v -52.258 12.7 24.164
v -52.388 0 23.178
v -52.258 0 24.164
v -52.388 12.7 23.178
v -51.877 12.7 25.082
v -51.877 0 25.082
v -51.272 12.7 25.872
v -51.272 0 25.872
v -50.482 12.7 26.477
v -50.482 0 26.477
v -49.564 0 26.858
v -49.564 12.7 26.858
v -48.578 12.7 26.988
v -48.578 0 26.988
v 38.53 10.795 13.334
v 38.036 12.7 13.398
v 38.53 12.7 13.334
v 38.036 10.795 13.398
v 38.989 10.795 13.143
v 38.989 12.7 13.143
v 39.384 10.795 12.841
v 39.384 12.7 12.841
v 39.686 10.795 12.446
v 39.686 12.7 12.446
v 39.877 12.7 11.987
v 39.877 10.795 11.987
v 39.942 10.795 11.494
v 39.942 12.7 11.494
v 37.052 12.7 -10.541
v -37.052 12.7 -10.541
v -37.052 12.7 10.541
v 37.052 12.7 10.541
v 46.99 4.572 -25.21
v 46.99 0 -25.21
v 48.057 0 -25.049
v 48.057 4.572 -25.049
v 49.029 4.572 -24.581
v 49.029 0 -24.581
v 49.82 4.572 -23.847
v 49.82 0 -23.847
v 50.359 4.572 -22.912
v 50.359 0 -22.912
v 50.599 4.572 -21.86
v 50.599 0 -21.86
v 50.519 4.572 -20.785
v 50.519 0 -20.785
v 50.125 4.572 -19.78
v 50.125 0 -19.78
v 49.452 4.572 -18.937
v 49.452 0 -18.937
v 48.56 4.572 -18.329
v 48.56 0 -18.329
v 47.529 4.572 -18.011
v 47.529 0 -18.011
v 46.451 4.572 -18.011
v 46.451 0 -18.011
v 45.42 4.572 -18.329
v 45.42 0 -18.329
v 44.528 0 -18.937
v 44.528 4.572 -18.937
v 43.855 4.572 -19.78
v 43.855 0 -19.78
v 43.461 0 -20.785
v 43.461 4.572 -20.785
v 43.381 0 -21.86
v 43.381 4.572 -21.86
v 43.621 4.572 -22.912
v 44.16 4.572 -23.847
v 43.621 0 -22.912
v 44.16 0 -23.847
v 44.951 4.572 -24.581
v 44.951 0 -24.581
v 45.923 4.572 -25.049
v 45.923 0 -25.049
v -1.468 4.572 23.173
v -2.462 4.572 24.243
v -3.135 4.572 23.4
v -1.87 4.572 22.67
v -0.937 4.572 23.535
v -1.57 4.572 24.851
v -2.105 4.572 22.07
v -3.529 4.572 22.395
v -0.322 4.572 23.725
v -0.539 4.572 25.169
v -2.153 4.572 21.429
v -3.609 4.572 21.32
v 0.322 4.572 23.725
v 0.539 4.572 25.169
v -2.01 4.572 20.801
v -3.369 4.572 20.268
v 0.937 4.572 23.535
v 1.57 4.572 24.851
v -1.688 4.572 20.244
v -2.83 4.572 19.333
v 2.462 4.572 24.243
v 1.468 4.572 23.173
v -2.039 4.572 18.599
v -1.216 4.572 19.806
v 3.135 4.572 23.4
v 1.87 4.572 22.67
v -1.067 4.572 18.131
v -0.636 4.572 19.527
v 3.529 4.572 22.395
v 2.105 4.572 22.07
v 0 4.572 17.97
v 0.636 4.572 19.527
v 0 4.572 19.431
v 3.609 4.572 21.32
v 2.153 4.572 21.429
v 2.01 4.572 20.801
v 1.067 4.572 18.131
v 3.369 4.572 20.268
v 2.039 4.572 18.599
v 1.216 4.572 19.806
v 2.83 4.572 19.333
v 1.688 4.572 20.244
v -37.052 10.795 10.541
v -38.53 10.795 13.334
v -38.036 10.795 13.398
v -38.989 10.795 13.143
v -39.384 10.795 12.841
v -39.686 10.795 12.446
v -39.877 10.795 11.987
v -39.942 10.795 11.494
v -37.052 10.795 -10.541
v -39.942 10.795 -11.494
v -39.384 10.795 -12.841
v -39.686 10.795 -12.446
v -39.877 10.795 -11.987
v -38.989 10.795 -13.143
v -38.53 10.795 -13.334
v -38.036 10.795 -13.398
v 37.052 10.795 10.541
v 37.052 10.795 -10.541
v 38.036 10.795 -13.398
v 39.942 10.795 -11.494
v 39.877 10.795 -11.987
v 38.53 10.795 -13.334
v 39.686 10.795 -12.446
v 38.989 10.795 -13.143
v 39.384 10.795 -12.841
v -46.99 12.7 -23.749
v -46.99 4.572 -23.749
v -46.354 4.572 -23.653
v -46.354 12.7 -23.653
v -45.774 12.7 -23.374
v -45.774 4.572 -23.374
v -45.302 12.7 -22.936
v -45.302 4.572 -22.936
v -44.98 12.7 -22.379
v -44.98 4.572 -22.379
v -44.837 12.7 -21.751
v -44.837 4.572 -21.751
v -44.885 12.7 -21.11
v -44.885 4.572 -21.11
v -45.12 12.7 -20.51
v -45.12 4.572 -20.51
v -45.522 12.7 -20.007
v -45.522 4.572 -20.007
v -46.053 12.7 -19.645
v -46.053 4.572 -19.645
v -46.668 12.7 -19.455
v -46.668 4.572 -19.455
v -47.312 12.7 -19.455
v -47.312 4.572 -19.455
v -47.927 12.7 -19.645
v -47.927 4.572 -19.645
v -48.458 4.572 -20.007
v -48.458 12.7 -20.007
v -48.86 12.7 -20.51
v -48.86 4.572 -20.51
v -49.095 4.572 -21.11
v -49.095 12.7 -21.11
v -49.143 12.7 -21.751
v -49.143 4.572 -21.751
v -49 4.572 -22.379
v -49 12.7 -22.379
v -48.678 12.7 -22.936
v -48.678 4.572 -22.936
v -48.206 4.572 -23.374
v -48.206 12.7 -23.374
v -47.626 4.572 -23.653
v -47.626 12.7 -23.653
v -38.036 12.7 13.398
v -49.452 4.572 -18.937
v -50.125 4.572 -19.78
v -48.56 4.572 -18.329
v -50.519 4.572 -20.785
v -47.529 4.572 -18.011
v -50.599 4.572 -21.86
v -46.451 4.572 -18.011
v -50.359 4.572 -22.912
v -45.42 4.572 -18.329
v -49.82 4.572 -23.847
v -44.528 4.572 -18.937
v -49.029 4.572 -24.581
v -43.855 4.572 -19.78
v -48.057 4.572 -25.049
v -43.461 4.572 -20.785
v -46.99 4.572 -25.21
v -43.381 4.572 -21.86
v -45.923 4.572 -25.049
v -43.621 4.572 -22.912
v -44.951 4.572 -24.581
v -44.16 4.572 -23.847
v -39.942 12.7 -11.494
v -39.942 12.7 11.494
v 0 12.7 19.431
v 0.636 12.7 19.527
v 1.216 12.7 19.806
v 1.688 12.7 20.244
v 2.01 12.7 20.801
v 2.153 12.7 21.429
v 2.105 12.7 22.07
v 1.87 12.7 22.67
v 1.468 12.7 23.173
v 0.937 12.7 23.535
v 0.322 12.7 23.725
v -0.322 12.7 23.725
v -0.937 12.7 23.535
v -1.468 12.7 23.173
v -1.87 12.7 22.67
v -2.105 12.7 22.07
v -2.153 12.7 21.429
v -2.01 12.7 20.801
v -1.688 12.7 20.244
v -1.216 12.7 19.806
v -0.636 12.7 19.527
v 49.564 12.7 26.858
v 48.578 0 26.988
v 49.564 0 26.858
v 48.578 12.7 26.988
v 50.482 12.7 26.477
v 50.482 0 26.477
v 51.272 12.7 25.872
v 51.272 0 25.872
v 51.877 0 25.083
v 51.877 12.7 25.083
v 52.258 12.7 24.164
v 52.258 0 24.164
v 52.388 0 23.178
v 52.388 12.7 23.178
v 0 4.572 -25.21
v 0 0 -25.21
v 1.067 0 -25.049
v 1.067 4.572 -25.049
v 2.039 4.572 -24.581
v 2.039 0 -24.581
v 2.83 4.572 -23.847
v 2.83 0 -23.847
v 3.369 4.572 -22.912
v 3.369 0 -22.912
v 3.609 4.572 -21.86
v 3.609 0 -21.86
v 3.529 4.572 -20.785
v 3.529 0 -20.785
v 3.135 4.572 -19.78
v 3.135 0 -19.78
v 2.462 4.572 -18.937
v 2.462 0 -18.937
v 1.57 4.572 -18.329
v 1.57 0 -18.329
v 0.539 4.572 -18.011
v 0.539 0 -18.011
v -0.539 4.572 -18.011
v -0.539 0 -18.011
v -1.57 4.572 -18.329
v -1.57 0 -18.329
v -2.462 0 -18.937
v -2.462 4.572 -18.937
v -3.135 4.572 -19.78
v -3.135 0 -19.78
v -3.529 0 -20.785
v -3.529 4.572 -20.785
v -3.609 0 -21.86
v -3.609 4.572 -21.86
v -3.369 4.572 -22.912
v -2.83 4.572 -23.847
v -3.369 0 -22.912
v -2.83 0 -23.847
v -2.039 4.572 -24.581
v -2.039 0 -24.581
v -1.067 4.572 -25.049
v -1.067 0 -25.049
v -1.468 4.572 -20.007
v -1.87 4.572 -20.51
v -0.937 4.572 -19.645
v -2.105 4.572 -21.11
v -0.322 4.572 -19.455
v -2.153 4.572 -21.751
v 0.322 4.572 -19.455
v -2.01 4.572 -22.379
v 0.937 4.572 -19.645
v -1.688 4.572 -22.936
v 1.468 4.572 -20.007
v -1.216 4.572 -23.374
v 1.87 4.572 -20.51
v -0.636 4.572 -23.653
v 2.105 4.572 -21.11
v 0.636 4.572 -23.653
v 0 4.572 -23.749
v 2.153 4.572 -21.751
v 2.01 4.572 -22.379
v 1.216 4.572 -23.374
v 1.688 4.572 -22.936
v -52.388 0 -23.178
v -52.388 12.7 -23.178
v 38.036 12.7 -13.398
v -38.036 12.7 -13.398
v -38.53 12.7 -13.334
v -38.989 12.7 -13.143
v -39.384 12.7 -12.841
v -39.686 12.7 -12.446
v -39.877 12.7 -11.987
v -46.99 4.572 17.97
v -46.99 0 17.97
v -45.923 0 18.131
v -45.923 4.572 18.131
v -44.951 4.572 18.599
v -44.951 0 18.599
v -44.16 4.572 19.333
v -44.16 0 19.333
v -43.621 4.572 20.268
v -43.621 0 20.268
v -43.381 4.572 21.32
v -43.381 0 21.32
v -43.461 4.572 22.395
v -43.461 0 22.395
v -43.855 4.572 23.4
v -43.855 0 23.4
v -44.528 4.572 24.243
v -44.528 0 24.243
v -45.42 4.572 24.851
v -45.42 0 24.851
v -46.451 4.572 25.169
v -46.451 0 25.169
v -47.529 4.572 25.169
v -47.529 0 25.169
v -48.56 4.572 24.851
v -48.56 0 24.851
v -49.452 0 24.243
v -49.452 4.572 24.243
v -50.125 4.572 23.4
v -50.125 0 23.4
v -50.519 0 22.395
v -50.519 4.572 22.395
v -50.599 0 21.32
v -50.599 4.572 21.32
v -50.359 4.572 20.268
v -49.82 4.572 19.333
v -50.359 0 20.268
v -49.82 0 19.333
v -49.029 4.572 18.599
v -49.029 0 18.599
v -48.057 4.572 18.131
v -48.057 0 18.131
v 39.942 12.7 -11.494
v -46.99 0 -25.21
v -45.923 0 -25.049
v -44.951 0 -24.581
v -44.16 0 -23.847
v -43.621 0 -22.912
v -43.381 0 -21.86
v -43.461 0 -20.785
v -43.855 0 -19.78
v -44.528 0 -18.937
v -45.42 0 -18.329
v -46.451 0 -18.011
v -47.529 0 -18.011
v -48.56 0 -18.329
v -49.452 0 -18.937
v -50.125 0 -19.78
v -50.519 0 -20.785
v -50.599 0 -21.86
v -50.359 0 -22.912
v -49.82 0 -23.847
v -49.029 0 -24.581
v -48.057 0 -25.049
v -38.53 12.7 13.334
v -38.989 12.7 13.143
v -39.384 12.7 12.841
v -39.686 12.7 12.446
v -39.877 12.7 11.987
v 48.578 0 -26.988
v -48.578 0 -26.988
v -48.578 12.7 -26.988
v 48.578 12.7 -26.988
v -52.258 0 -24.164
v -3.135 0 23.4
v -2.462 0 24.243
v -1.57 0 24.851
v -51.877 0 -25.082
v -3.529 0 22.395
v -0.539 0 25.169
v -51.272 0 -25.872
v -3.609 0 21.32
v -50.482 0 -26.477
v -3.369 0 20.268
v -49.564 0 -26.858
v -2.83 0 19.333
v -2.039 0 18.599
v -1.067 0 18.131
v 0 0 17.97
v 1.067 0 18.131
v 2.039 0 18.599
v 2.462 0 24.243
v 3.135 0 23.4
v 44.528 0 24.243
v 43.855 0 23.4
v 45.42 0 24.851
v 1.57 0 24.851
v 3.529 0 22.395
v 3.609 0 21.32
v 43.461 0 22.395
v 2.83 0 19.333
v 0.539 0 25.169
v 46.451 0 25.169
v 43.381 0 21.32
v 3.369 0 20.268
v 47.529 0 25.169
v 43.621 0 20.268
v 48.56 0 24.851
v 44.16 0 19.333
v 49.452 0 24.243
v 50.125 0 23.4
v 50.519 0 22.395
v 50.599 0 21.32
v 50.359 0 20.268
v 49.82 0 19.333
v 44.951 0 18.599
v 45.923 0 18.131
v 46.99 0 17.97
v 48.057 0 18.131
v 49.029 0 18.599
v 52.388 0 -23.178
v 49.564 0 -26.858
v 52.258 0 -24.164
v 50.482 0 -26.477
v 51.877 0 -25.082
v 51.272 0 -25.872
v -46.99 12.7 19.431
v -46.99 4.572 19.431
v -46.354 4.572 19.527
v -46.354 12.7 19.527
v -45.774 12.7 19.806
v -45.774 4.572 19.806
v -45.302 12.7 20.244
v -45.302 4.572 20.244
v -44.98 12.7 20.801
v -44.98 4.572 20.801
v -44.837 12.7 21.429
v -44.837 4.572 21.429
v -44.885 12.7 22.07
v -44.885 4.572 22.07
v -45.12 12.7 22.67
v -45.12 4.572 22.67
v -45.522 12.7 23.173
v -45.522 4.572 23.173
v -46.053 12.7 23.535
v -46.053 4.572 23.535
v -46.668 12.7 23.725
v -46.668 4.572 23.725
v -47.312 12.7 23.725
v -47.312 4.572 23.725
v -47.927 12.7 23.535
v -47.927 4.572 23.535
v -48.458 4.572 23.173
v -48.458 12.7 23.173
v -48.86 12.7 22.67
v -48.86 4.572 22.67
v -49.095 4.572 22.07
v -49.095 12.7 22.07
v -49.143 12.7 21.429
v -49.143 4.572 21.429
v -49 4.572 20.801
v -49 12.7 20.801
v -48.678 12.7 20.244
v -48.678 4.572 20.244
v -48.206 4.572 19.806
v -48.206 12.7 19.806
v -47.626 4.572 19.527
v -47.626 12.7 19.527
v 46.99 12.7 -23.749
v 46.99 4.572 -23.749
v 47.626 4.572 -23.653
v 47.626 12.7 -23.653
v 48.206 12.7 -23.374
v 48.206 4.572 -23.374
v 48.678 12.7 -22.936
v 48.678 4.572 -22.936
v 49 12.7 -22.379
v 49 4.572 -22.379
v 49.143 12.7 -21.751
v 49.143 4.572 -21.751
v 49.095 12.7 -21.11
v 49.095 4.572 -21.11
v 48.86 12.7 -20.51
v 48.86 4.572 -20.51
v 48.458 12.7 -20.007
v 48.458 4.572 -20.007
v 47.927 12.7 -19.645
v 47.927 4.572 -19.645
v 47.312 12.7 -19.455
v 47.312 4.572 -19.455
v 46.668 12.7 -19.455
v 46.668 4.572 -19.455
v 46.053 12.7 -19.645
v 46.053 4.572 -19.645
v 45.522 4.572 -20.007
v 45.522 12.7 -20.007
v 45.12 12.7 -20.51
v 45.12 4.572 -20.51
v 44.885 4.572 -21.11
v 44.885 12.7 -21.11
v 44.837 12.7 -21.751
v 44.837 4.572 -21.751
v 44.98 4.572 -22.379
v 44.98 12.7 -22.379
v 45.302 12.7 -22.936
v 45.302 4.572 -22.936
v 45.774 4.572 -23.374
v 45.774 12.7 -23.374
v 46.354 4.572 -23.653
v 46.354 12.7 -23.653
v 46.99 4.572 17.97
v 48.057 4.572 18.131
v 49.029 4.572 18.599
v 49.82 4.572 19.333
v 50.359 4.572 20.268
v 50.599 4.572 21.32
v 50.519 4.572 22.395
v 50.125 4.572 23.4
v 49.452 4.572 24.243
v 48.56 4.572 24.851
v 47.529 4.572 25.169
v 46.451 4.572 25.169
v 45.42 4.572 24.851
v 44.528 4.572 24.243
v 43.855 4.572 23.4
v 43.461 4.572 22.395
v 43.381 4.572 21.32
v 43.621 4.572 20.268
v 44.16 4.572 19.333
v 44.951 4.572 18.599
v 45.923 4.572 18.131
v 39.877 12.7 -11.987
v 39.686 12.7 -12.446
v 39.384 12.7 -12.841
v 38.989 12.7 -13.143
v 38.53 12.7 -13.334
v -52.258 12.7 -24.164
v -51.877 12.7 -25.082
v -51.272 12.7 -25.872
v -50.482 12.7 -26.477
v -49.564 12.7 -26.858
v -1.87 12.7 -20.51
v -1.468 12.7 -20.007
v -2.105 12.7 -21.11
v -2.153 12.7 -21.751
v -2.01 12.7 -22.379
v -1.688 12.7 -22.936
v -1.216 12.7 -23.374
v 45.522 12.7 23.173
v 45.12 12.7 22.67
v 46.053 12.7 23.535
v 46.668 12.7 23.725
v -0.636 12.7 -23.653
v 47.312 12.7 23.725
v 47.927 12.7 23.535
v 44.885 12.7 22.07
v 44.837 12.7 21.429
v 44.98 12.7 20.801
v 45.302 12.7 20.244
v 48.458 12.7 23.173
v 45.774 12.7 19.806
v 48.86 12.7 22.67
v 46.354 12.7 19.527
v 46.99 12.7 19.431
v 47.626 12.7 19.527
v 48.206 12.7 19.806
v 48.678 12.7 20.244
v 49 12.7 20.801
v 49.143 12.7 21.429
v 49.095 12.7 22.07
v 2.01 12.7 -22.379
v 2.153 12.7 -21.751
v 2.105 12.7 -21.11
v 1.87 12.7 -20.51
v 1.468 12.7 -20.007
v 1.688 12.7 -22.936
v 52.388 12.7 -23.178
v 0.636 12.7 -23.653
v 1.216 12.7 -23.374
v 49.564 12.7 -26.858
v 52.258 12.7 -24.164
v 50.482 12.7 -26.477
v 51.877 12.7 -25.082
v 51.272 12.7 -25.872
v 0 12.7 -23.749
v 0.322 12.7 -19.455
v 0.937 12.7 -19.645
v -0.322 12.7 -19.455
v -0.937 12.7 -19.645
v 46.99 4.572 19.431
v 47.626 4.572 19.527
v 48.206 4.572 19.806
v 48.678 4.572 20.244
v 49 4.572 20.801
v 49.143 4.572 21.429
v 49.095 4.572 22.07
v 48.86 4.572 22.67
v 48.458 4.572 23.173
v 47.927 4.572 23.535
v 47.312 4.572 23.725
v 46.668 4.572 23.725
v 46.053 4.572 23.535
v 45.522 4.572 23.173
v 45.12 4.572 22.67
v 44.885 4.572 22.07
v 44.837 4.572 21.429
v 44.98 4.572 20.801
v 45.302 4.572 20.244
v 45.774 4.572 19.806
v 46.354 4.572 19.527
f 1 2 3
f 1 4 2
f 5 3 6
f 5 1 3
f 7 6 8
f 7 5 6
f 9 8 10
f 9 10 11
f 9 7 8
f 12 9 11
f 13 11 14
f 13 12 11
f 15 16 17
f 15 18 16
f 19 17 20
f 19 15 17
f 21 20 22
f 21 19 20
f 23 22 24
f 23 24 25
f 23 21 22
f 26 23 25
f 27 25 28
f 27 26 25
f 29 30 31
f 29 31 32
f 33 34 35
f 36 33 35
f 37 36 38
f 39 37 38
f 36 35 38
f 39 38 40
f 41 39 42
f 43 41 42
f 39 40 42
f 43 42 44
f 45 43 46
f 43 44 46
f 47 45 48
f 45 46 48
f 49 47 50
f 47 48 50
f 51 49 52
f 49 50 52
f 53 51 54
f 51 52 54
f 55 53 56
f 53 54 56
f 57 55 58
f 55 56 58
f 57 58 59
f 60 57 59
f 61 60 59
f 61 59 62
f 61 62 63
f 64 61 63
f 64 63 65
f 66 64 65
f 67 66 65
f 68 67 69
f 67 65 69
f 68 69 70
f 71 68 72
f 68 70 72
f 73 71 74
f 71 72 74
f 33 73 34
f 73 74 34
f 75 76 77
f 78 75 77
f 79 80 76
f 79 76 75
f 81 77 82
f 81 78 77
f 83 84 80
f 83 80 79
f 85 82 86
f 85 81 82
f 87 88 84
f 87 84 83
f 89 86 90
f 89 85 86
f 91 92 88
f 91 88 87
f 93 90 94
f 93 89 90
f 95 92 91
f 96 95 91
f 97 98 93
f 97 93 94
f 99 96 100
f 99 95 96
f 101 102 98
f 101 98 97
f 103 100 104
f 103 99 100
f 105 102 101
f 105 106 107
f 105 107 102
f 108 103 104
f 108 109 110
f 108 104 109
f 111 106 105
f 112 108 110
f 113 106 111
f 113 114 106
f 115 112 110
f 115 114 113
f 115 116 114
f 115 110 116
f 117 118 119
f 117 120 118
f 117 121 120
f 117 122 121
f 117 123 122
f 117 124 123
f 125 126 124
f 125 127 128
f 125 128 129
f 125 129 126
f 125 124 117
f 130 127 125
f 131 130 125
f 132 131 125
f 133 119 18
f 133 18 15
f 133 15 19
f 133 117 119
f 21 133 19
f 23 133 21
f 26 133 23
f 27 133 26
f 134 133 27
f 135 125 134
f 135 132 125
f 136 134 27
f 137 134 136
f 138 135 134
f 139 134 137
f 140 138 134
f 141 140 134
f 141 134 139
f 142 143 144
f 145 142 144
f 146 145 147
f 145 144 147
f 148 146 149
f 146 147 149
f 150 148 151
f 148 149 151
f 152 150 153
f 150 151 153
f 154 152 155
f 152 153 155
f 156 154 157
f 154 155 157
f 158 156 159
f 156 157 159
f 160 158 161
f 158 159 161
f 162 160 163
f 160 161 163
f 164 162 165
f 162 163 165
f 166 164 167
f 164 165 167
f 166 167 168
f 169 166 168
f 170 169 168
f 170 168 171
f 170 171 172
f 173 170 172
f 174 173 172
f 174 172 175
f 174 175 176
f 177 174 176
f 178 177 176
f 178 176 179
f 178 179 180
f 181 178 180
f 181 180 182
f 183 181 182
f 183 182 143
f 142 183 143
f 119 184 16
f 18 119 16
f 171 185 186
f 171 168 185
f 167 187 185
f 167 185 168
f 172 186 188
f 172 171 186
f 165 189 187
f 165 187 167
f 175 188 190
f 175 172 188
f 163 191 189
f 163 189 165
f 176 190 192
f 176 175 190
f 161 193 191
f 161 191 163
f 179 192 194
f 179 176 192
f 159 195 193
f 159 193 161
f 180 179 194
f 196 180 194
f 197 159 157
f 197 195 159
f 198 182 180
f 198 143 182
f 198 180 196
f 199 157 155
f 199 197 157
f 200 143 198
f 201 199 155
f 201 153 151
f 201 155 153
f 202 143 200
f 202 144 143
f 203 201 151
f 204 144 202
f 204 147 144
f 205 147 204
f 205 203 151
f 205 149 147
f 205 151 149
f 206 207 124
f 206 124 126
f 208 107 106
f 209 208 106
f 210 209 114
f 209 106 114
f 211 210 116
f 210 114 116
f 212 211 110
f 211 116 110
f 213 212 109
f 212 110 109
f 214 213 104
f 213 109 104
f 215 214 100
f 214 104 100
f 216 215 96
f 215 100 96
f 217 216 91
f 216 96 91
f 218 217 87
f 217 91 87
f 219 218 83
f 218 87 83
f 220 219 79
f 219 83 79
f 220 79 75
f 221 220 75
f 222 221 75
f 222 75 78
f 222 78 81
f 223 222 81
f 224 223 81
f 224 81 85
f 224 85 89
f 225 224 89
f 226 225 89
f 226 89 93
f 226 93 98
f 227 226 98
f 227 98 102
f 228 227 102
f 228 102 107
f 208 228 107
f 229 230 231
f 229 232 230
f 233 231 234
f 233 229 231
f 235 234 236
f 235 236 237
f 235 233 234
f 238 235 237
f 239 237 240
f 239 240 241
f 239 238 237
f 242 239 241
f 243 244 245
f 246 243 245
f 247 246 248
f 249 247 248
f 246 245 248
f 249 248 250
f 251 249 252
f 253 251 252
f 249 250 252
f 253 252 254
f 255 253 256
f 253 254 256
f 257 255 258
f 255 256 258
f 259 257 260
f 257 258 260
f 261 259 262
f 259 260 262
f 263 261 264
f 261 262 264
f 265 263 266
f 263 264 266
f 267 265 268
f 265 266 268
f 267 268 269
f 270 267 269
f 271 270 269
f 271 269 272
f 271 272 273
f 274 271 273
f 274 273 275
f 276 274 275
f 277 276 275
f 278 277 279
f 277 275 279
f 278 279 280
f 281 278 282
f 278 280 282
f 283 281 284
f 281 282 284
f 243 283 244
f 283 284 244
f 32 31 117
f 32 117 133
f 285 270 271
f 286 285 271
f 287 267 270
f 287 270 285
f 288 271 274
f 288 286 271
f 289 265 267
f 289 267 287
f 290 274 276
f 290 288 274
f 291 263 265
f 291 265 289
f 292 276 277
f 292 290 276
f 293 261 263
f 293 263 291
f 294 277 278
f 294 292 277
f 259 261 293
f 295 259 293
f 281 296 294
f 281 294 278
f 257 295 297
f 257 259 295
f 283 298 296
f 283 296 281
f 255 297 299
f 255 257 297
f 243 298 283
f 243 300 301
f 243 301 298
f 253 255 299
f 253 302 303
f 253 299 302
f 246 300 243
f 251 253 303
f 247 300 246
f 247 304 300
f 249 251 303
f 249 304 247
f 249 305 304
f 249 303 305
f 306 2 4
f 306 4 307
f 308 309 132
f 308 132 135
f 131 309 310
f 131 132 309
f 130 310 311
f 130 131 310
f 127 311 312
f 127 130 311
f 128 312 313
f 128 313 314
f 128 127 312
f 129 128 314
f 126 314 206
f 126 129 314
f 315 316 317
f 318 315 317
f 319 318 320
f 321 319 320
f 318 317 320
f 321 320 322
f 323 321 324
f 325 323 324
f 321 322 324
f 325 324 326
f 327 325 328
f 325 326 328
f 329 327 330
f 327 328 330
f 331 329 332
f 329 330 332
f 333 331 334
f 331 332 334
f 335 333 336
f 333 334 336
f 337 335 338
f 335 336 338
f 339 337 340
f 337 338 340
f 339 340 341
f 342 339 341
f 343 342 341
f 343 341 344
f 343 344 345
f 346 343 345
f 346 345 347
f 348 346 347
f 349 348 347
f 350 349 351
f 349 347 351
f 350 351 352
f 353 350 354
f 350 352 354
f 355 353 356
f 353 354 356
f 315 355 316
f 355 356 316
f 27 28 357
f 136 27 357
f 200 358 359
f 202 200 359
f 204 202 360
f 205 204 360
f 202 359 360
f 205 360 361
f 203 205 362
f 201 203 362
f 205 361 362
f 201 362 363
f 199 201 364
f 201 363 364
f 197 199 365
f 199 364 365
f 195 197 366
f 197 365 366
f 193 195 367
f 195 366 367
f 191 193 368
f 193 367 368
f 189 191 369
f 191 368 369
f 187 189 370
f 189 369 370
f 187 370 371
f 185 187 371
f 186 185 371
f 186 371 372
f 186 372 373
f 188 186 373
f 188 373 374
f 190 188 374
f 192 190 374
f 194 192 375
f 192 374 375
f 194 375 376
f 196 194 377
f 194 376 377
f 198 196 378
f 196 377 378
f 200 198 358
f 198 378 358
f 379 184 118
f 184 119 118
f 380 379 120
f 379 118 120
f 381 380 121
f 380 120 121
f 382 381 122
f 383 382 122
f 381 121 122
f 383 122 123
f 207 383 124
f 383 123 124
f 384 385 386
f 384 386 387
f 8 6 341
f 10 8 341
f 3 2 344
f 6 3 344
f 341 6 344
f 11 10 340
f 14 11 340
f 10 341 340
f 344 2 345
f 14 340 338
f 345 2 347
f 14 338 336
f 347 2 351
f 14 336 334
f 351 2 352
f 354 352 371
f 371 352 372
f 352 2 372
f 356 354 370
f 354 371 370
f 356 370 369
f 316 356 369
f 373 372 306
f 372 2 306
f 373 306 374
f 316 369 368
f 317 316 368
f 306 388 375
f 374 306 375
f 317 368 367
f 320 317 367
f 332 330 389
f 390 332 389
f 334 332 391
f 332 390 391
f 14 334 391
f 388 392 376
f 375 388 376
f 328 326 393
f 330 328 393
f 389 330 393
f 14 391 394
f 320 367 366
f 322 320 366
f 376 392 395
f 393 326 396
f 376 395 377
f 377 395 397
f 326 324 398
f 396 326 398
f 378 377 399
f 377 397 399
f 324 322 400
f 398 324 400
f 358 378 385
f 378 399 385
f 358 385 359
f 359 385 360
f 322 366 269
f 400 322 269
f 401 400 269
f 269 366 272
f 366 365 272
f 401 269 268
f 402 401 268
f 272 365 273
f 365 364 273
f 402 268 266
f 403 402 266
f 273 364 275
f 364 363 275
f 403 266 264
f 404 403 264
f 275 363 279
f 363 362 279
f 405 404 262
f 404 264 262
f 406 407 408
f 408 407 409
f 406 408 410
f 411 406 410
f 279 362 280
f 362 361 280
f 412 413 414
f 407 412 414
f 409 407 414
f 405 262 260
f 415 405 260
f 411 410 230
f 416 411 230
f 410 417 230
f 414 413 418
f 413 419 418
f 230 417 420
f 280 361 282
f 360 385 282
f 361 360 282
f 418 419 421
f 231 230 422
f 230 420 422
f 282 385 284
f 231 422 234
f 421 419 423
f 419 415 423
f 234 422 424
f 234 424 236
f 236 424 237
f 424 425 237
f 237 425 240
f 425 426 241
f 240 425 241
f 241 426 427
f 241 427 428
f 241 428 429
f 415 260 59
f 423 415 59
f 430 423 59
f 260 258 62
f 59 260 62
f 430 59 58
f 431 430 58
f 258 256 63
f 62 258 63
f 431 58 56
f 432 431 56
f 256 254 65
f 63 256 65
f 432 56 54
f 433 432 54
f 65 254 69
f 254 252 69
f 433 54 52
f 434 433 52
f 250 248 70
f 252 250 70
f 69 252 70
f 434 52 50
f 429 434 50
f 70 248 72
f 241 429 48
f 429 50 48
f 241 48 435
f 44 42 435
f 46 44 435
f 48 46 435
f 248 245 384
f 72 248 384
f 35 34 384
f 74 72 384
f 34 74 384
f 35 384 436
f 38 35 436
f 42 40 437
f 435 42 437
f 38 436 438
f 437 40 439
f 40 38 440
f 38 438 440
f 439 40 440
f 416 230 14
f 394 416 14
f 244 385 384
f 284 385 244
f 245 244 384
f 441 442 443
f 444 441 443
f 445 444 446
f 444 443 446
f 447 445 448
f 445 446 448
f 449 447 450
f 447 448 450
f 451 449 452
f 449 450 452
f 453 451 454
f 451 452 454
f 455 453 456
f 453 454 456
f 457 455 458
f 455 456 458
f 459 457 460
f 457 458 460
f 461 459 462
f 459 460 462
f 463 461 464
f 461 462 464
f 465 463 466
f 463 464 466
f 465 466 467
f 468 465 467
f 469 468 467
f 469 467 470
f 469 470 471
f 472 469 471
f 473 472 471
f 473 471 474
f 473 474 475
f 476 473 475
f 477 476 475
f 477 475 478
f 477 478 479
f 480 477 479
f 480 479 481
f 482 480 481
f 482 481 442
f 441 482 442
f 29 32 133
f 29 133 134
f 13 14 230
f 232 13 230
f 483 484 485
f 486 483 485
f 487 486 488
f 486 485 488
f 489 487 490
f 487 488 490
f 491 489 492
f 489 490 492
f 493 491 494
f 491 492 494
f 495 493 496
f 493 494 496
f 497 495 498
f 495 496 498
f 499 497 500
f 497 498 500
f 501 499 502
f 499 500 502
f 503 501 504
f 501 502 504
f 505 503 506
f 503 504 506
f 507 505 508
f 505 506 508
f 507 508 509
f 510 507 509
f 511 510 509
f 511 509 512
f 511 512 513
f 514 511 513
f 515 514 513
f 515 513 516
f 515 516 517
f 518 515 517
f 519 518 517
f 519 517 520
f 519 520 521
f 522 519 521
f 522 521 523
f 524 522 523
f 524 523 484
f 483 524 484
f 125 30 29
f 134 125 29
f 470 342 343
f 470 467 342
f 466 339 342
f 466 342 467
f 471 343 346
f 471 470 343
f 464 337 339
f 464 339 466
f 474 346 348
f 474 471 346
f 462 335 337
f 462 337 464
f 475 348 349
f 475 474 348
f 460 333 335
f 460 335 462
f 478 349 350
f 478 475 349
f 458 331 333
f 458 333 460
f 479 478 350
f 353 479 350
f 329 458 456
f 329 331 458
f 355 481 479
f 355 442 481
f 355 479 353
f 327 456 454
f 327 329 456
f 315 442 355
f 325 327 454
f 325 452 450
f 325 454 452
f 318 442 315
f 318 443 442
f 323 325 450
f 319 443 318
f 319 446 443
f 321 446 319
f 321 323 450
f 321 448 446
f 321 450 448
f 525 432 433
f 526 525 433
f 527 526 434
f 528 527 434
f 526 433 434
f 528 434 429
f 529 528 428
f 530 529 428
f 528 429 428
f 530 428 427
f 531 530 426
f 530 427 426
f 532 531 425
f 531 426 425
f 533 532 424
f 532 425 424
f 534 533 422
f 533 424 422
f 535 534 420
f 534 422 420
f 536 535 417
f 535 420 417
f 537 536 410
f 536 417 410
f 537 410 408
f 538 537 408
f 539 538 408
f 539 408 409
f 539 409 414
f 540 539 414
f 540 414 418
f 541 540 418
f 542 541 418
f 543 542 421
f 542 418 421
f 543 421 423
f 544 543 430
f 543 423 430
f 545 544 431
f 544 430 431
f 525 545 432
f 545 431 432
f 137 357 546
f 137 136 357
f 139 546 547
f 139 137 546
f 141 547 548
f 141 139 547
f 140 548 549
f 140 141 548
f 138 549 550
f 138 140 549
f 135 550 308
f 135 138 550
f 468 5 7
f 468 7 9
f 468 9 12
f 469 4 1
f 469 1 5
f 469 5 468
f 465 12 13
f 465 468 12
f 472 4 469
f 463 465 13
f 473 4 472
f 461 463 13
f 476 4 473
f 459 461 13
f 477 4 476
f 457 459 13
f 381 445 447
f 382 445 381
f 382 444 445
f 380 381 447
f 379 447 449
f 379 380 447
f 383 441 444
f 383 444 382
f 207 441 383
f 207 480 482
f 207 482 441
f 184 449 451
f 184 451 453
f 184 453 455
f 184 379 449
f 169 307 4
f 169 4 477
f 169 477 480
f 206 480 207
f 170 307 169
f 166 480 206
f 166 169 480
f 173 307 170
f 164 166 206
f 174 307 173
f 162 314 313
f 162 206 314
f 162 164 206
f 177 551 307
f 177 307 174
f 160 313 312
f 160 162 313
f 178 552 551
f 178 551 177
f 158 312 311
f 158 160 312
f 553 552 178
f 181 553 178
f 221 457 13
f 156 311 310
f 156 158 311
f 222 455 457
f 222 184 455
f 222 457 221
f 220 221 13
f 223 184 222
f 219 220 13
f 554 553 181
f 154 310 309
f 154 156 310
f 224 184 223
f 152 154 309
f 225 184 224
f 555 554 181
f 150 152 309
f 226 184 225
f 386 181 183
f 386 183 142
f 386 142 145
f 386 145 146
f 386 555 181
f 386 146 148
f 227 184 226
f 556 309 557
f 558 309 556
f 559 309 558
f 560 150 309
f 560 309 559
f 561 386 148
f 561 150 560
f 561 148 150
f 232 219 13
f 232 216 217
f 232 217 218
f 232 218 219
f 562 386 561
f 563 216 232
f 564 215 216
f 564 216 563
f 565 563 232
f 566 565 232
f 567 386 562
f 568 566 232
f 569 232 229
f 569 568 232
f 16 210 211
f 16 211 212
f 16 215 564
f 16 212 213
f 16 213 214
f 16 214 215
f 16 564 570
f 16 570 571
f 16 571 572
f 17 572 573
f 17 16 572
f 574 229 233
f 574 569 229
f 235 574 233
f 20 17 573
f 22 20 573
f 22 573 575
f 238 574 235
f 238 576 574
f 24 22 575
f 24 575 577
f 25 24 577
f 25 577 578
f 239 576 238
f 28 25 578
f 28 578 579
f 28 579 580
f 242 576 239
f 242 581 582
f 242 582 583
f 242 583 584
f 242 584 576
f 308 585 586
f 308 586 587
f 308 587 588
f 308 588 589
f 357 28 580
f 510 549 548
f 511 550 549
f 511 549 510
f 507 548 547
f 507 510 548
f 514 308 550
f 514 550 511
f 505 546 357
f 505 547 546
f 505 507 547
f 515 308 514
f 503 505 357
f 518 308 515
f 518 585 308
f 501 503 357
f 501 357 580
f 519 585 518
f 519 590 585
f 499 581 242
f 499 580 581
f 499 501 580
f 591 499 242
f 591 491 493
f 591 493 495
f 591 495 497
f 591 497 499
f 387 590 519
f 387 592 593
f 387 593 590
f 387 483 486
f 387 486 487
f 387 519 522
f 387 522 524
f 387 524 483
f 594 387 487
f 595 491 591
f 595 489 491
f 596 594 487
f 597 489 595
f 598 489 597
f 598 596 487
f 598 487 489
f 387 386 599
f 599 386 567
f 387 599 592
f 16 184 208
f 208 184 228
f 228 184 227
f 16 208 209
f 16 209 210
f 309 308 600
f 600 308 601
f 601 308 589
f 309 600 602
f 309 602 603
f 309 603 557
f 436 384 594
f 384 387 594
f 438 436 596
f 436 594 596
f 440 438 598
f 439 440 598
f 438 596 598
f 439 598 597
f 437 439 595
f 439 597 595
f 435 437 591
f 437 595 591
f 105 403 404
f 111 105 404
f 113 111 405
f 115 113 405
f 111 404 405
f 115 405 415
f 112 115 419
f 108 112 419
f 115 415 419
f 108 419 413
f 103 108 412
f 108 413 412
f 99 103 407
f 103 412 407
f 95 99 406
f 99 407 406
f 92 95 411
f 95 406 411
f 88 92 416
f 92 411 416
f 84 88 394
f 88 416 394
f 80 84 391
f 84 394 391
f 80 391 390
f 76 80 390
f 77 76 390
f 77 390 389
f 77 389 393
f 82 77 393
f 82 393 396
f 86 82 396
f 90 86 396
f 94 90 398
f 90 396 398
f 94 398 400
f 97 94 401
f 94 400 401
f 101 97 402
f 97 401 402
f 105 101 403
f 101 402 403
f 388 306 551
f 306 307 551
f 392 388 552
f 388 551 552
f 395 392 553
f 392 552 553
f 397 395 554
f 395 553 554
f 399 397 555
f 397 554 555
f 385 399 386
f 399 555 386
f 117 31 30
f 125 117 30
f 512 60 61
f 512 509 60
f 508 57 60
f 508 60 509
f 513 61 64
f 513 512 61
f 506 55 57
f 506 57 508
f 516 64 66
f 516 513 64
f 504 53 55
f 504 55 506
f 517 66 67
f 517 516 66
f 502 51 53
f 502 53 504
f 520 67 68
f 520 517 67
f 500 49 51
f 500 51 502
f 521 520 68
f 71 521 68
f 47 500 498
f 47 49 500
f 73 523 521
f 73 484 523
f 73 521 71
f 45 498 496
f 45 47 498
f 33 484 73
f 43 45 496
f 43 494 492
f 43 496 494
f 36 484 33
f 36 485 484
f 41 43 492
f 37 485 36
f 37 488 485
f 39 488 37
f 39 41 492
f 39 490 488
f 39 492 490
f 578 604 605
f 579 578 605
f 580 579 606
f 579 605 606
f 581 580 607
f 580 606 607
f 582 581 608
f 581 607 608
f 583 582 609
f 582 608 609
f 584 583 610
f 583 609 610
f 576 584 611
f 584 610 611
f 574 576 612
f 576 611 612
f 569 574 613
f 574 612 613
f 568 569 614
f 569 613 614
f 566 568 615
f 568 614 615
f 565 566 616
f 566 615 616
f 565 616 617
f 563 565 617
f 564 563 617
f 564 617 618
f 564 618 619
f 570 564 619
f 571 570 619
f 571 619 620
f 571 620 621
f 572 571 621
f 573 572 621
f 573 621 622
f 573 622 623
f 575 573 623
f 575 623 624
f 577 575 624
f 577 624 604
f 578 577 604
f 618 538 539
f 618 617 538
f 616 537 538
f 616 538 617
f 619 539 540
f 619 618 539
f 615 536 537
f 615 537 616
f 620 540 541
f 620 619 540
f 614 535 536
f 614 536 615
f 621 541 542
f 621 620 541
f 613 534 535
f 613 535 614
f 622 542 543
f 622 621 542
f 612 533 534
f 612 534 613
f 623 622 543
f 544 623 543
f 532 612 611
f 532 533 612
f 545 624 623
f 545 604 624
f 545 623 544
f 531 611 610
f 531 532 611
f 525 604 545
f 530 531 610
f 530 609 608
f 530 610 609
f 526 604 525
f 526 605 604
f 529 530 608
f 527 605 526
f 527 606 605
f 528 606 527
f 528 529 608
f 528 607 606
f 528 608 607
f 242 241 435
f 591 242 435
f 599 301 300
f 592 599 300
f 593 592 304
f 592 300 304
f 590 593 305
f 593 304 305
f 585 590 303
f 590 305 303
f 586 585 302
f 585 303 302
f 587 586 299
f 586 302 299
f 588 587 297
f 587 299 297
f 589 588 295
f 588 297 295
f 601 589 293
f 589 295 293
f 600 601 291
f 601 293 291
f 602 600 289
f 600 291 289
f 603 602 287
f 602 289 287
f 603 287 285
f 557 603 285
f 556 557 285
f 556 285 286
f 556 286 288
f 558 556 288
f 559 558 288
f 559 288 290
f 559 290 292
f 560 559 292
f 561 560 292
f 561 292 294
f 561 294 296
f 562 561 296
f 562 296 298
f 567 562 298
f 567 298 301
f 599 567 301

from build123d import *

# Parameters (mm, degrees)
SKETCH1_W           = 104.775
SKETCH1_H           = 53.975
BOSS_EXTRUDE1_DEPTH = 12.7
SKETCH3_W           = 79.883
SKETCH3_H           = 26.797
SKETCH3_W_2         = 74.1045
SKETCH3_H_2         = 21.082
CUT_EXTRUDE1_DEPTH  = 1.905
FILLET1_R           = 1.905
SKETCH4_R           = 2.159
CUT_EXTRUDE2_DEPTH  = 61.283209209
SKETCH8_R           = 3.6195
CUT_EXTRUDE3_DEPTH  = 4.572
FILLET2_R           = 3.81


with BuildPart() as part:
    # Sketch1 → Boss-Extrude1 (new body)
    with BuildSketch(Plane(origin=(0, 0, 0), x_dir=(1, 0, 0), z_dir=(0, 1, 0))):
        Rectangle(SKETCH1_W, SKETCH1_H)
    extrude(amount=BOSS_EXTRUDE1_DEPTH)

    # Sketch3 → Cut-Extrude1 (cut)
    with BuildSketch(Plane(origin=(0, 12.7, 0), x_dir=(1, 0, 0), z_dir=(0, 1, 0))):
        Rectangle(SKETCH3_W, SKETCH3_H)
        Rectangle(SKETCH3_W_2, SKETCH3_H_2, mode=Mode.SUBTRACT)
    extrude(amount=-CUT_EXTRUDE1_DEPTH, mode=Mode.SUBTRACT)

    # Fillet1
    fillet1_edges = [part.edges().sort_by_distance(p)[0] for p in [
        (39.9415, 11.7475, -13.3985),
        (39.9415, 11.7475, 13.3985),
        (-39.9415, 11.7475, 13.3985),
        (-39.9415, 11.7475, -13.3985),
    ]]
    fillet(fillet1_edges, radius=FILLET1_R)

    # Sketch4 → Cut-Extrude2 (cut, through all)
    with BuildSketch(Plane.XZ):
        with Locations(Location((-46.99, 21.59, 0), (0, 0, 270))):
            Circle(SKETCH4_R)
        with Locations(Location((46.99, 21.59, 0), (0, 0, 270))):
            Circle(SKETCH4_R)
        with Locations(Location((-46.99, -21.59, 0), (0, 0, 270))):
            Circle(SKETCH4_R)
        with Locations(Location((46.99, -21.59, 0), (0, 0, 270))):
            Circle(SKETCH4_R)
        with Locations(Location((0, 21.59, 0), (0, 0, 270))):
            Circle(SKETCH4_R)
        with Locations(Location((0, -21.59, 0), (0, 0, 270))):
            Circle(SKETCH4_R)
    extrude(amount=-CUT_EXTRUDE2_DEPTH, mode=Mode.SUBTRACT)

    # Sketch8 → Cut-Extrude3 (cut)
    with BuildSketch(Plane.XZ):
        with Locations(Location((-46.99, 21.59, 0), (0, 0, 270))):
            Circle(SKETCH8_R)
        with Locations(Location((0, 21.59, 0), (0, 0, 270))):
            Circle(SKETCH8_R)
        with Locations(Location((46.99, 21.59, 0), (0, 0, 270))):
            Circle(SKETCH8_R)
        with Locations(Location((46.99, -21.59, 0), (0, 0, 270))):
            Circle(SKETCH8_R)
        with Locations(Location((0, -21.59, 0), (0, 0, 270))):
            Circle(SKETCH8_R)
        with Locations(Location((-46.99, -21.59, 0), (0, 0, 270))):
            Circle(SKETCH8_R)
    extrude(amount=-CUT_EXTRUDE3_DEPTH, mode=Mode.SUBTRACT)

    # Fillet2
    fillet2_edges = [part.edges().sort_by_distance(p)[0] for p in [
        (52.3875, 6.35, 26.9875),
        (-52.3875, 6.35, 26.9875),
        (-52.3875, 6.35, -26.9875),
        (52.3875, 6.35, -26.9875),
    ]]
    fillet(fillet2_edges, radius=FILLET2_R)


solid = part.part
